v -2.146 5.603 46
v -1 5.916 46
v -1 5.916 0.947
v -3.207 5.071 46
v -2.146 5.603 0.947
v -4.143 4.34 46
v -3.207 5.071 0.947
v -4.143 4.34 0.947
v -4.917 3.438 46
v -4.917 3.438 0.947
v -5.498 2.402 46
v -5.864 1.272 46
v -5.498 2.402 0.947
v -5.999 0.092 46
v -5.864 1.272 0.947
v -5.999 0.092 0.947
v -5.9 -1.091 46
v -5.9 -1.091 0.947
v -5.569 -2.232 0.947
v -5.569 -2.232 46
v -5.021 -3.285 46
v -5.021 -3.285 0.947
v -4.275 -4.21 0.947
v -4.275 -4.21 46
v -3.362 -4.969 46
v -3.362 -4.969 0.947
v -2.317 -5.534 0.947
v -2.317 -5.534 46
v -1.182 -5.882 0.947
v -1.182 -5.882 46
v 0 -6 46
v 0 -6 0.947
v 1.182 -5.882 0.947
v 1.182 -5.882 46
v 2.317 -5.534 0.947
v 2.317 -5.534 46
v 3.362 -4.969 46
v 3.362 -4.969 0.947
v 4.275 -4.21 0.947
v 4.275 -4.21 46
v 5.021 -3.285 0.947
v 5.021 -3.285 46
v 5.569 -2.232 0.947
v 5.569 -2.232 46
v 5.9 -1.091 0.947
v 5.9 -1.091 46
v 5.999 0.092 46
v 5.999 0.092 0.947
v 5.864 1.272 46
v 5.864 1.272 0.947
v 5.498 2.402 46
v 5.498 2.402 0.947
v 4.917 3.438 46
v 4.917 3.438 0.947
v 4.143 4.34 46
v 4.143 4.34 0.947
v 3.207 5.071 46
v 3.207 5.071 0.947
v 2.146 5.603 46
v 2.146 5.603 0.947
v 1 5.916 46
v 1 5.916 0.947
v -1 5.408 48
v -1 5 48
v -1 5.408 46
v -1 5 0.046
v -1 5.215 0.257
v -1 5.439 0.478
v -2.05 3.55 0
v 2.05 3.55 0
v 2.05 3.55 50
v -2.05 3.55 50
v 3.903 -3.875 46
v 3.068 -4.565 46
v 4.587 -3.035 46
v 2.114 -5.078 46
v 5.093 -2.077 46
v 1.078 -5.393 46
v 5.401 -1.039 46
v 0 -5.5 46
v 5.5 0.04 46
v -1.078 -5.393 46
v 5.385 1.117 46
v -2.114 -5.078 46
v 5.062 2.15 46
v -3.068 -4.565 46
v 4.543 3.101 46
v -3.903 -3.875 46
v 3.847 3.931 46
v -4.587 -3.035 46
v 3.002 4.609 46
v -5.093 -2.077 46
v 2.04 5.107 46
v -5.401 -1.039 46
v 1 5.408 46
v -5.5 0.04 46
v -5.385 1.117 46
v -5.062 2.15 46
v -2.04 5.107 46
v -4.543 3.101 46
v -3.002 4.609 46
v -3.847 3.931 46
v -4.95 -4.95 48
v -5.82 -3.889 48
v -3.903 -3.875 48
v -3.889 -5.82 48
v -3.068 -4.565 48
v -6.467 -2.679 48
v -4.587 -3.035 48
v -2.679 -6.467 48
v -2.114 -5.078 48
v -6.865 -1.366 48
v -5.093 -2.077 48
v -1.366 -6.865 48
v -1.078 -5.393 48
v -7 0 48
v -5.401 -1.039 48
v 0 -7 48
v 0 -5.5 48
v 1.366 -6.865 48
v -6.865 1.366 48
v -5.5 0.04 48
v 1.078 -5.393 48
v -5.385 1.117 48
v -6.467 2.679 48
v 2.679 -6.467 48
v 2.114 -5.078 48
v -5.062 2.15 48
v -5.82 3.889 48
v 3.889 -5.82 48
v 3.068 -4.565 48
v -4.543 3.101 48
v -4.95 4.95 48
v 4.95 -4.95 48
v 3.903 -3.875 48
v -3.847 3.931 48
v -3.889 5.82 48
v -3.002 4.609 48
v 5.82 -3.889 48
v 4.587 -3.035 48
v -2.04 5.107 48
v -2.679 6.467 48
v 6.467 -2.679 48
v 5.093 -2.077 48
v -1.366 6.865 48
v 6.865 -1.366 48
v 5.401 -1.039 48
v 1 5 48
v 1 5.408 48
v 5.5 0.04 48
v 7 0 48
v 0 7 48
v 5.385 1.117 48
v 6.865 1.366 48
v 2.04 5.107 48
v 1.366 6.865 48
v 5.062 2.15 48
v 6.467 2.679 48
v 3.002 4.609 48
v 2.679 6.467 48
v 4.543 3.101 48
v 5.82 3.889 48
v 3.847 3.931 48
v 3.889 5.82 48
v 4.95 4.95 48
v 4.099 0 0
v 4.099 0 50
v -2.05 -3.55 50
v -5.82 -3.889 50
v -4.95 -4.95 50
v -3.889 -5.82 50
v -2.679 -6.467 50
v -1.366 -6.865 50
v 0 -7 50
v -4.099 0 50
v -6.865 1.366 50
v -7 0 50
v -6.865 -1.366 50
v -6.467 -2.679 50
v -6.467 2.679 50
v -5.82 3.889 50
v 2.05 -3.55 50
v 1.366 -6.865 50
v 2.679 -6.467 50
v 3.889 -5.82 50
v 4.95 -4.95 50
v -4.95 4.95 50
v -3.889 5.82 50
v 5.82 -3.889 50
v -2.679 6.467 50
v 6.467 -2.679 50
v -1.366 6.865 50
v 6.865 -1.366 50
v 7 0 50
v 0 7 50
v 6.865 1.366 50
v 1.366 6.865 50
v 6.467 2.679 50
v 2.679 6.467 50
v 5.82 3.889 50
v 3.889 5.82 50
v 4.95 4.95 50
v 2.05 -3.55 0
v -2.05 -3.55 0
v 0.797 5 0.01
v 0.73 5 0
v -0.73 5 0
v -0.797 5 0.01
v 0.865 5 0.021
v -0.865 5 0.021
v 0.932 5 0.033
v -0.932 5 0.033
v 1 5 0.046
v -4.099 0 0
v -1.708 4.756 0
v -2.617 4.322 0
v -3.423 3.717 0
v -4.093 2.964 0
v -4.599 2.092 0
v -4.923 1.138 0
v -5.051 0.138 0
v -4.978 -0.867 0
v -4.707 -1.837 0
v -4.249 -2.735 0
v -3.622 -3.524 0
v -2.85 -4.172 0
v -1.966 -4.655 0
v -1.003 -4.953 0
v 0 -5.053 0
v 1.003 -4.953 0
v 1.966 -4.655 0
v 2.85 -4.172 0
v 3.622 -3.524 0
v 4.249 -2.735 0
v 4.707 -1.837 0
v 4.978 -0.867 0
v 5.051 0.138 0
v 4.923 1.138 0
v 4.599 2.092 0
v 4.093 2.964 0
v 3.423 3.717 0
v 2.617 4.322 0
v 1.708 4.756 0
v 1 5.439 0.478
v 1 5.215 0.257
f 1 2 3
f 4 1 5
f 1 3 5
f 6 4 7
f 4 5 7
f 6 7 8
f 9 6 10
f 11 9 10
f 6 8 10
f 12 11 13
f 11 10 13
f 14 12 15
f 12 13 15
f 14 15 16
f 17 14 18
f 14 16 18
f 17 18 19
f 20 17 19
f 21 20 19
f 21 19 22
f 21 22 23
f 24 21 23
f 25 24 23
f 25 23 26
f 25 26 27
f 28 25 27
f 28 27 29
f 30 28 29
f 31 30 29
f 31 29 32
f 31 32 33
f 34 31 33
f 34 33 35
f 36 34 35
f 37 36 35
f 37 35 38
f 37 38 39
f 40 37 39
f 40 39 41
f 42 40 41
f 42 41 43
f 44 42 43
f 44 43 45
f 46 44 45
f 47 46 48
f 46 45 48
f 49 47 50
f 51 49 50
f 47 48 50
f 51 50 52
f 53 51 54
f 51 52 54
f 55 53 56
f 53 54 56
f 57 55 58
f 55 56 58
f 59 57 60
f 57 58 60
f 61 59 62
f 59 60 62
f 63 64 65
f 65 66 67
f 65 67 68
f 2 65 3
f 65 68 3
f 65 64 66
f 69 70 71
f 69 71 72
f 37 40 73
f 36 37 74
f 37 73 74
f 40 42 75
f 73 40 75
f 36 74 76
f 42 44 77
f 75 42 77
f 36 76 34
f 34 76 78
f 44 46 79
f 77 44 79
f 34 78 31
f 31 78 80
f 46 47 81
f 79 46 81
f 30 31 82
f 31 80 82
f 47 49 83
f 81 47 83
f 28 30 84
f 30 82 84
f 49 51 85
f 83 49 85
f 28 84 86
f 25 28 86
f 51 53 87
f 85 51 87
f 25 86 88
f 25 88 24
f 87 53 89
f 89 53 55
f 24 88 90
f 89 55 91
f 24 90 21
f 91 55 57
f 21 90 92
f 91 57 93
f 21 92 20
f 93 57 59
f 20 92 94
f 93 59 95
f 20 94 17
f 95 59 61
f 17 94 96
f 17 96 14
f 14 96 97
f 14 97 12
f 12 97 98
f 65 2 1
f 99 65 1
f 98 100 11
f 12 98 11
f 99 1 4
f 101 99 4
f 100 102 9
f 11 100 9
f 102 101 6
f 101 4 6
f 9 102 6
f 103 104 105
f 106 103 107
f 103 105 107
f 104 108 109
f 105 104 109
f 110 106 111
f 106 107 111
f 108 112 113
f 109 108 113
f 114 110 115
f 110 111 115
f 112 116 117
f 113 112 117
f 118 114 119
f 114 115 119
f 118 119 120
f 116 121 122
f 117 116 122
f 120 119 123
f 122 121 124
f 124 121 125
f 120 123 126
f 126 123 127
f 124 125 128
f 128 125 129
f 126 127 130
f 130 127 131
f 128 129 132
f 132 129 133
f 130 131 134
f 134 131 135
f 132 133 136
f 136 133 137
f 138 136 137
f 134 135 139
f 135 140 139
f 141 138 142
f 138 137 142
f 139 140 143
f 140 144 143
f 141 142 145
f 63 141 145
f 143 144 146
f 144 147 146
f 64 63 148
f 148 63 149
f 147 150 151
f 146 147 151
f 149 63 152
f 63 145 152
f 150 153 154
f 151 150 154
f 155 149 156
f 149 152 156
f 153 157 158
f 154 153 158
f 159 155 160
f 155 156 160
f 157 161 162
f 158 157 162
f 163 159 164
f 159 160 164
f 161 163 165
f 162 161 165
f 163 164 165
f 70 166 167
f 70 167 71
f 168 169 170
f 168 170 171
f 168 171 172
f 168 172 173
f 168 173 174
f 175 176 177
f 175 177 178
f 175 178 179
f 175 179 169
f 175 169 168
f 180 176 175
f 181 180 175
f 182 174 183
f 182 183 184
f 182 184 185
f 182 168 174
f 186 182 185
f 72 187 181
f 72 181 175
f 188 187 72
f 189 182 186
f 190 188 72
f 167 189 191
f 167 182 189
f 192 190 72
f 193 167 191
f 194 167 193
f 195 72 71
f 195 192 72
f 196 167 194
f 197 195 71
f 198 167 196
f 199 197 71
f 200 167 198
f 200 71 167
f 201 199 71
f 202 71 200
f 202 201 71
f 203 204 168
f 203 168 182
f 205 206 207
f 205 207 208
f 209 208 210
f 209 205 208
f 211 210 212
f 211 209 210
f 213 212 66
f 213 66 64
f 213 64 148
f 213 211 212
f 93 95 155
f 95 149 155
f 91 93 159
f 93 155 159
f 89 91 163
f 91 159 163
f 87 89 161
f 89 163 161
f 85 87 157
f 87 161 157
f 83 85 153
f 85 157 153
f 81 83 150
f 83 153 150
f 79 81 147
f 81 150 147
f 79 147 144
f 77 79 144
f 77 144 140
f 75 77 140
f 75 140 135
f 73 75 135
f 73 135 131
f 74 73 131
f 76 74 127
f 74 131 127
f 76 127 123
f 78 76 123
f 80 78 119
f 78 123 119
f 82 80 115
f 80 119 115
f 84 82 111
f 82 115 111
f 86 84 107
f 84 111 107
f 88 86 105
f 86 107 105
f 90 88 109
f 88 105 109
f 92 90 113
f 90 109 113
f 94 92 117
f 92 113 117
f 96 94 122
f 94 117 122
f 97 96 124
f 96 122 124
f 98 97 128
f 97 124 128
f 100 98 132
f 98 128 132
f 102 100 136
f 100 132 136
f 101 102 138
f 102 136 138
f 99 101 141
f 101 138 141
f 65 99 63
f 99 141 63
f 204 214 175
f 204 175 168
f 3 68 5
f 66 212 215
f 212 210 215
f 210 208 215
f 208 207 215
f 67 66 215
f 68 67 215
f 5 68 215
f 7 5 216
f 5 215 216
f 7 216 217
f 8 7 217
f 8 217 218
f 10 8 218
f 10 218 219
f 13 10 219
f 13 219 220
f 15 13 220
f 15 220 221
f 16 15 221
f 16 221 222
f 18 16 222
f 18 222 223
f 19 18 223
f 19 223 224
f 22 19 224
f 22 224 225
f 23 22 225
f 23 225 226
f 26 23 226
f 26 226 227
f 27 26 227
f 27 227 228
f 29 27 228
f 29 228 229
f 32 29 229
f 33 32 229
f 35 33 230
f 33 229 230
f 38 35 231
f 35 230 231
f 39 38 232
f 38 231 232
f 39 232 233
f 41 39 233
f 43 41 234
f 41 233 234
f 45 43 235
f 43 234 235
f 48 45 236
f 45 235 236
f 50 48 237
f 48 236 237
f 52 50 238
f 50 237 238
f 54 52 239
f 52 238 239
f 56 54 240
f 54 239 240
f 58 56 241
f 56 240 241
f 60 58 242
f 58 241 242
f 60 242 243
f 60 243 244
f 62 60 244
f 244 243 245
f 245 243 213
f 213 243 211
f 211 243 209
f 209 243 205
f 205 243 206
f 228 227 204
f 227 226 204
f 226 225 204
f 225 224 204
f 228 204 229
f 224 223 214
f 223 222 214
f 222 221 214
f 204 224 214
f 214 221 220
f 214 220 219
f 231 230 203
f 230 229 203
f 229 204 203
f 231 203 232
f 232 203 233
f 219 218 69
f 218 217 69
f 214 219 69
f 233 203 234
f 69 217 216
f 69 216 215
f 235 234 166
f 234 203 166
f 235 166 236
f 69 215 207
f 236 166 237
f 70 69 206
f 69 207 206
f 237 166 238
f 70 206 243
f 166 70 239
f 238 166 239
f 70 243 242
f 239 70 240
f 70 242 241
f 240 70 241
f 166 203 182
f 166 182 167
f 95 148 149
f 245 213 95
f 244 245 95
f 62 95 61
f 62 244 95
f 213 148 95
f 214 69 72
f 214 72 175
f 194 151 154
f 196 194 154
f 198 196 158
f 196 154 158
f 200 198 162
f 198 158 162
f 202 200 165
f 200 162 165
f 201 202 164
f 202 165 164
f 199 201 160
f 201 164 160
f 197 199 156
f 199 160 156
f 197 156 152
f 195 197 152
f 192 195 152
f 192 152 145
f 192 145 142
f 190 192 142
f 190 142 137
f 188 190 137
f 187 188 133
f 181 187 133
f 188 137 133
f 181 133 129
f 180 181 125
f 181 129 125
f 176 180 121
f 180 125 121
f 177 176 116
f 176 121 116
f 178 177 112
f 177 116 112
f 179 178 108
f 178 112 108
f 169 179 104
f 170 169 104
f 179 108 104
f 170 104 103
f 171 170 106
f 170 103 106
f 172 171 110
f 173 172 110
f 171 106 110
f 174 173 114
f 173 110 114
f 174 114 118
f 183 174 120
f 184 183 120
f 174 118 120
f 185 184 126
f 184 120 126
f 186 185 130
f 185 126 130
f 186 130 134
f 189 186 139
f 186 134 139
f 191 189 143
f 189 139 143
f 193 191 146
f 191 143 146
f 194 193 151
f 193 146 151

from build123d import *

# Parameters (mm, degrees)
SKETCH_1_R                        = 6
EXTRUDE_1_DEPTH                   = 50
EXTRUDE_START                     = -2
SKETCH_2_R                        = 7
SKETCH_2_R_2                      = 6
EXTRUDE_2_DEPTH                   = 2
SKETCH_3_OUTSIDE_W                = 26.756
SKETCH_3_OUTSIDE_H                = 26.756
SKETCH_3_OUTSIDE_R                = 5.5
CUT_EXTRUDE_1_DEPTH               = 2
SKETCH_6_W                        = 2
SKETCH_6_H                        = 1
CUT_EXTRUDE_1_2_DEPTH             = 2
CUT_EXTRUDE_1_2_DIRECTION_2_REACH = 52.971


# Read off the part's stored shape, not the designer's step: M12 机械螺纹 螺柱1
with BuildPart() as part:
    # 草图1 → 凸台-拉伸1 (new body)
    with BuildSketch(Plane.XY):
        Circle(SKETCH_1_R)
        Polygon((4.099186911, 0), (2.049593456, 3.55), (-2.049593456, 3.55), (-4.099186911, 0), (-2.049593456, -3.55), (2.049593456, -3.55), align=None, mode=Mode.SUBTRACT)
    extrude(amount=EXTRUDE_1_DEPTH)

    # 草图2 → 凸台-拉伸2 (add)
    with BuildSketch(Plane.XY.offset(50).offset(EXTRUDE_START)):
        Circle(SKETCH_2_R)
        Circle(SKETCH_2_R_2, mode=Mode.SUBTRACT)
    extrude(amount=EXTRUDE_2_DEPTH)

    # 草图3 outside → Cut-Extrude 1 (cut)
    with BuildSketch(Plane(origin=(0, 0, 48), x_dir=(-1, 0, 0), z_dir=(0, 0, -1))):
        Rectangle(SKETCH_3_OUTSIDE_W, SKETCH_3_OUTSIDE_H)
        Circle(SKETCH_3_OUTSIDE_R, mode=Mode.SUBTRACT)
    extrude(amount=CUT_EXTRUDE_1_DEPTH, mode=Mode.SUBTRACT)

    # M12 机械螺纹 螺柱1 outline → M12 机械螺纹 螺柱1 (revolve, cut)
    with BuildSketch(Plane.XZ):
        Polygon((6, 0.947), (5.053, 0), (6, 0), align=None)
    revolve(axis=Axis((0, 0, 0), (0, 0, 1)), mode=Mode.SUBTRACT)

    # 草图6 → Cut-Extrude 1 2 (cut)
    with BuildSketch(Plane.XY):
        with Locations((0, 5.5)):
            Rectangle(SKETCH_6_W, SKETCH_6_H)
    extrude(amount=-CUT_EXTRUDE_1_2_DEPTH, mode=Mode.SUBTRACT)

    # Cut-Extrude 1 2 direction 2: up to this face of the body (flat: up to its plane)
    cut_extrude_1_2_direction_2_end = Plane(part.part.faces().sort_by_distance((5.697989899, 0, 48))[0])
    # 草图6 → Cut-Extrude 1 2 direction 2 (cut, up to the picked face)
    with BuildSketch(Plane.XY, mode=Mode.PRIVATE) as cut_extrude_1_2_direction_2_sk1:
        with Locations((0, 5.5)):
            Rectangle(SKETCH_6_W, SKETCH_6_H)
    cut_extrude_1_2_direction_2_tool1 = split(extrude(cut_extrude_1_2_direction_2_sk1.sketch, amount=CUT_EXTRUDE_1_2_DIRECTION_2_REACH, mode=Mode.PRIVATE), bisect_by=cut_extrude_1_2_direction_2_end, keep=Keep.BOTH, mode=Mode.PRIVATE)
    add(cut_extrude_1_2_direction_2_tool1.solids().sort_by(Axis((0, 5.5, 0), (0, 0, 1)))[0], mode=Mode.SUBTRACT)


solid = part.part
